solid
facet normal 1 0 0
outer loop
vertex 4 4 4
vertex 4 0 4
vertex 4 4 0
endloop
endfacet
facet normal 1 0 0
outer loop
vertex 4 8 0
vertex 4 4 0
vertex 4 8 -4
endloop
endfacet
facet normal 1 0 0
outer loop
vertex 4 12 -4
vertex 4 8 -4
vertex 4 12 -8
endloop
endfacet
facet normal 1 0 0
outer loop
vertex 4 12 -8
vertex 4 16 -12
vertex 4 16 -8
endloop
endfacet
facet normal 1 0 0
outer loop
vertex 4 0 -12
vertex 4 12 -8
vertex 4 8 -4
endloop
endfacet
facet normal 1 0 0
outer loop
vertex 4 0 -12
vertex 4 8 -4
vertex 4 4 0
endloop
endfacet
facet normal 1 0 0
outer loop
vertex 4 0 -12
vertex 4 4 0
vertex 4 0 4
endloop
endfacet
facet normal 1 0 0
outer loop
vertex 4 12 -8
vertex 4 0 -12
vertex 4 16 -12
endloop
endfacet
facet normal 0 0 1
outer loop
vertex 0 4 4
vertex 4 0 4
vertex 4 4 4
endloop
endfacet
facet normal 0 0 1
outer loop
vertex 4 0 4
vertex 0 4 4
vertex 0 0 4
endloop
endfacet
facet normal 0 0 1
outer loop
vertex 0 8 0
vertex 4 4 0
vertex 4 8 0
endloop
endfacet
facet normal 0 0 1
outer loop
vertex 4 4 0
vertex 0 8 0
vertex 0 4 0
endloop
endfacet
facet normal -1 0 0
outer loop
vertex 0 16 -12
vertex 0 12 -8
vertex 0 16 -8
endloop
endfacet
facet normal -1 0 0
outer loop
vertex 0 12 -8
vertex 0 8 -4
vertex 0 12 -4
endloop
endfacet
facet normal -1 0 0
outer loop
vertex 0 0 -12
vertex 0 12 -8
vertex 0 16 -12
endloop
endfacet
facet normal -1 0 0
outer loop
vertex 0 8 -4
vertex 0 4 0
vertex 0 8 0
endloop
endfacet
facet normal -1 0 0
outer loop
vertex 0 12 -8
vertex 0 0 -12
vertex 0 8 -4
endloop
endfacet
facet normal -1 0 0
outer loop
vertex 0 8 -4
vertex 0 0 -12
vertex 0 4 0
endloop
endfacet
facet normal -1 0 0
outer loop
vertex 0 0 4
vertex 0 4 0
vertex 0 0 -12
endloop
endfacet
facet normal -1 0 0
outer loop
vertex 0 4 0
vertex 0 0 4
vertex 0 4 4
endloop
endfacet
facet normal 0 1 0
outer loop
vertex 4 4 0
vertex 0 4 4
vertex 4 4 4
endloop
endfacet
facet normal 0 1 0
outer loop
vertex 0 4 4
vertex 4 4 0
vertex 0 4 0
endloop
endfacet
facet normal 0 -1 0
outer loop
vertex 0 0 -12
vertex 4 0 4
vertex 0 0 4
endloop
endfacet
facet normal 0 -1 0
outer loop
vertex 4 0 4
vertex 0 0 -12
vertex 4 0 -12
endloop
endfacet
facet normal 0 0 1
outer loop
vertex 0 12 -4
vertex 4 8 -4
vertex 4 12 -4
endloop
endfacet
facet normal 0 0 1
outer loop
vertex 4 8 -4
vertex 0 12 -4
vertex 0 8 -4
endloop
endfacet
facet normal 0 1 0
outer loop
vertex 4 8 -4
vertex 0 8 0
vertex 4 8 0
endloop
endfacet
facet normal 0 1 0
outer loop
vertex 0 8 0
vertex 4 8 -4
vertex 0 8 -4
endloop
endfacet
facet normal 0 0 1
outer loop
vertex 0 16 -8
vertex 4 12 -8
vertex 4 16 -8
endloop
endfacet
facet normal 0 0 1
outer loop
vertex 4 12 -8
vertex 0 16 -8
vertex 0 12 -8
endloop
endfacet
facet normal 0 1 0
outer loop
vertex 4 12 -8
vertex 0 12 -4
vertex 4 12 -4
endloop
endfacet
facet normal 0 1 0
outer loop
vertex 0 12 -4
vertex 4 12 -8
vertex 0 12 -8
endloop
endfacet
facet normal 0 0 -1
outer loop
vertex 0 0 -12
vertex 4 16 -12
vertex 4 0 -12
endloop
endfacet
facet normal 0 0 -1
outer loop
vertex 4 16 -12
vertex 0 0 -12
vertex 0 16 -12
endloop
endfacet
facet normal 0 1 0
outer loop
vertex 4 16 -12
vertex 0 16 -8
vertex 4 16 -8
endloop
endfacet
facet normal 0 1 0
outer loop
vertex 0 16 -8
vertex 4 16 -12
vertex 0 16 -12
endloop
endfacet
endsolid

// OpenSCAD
module escalera(escalones=3)
{
    tamano = 4;
  
    for(i =[0:escalones])
    {       
       translate([0,0,i*-4])cube([4,4+4*i,4]);   
    }
}
escalera();
